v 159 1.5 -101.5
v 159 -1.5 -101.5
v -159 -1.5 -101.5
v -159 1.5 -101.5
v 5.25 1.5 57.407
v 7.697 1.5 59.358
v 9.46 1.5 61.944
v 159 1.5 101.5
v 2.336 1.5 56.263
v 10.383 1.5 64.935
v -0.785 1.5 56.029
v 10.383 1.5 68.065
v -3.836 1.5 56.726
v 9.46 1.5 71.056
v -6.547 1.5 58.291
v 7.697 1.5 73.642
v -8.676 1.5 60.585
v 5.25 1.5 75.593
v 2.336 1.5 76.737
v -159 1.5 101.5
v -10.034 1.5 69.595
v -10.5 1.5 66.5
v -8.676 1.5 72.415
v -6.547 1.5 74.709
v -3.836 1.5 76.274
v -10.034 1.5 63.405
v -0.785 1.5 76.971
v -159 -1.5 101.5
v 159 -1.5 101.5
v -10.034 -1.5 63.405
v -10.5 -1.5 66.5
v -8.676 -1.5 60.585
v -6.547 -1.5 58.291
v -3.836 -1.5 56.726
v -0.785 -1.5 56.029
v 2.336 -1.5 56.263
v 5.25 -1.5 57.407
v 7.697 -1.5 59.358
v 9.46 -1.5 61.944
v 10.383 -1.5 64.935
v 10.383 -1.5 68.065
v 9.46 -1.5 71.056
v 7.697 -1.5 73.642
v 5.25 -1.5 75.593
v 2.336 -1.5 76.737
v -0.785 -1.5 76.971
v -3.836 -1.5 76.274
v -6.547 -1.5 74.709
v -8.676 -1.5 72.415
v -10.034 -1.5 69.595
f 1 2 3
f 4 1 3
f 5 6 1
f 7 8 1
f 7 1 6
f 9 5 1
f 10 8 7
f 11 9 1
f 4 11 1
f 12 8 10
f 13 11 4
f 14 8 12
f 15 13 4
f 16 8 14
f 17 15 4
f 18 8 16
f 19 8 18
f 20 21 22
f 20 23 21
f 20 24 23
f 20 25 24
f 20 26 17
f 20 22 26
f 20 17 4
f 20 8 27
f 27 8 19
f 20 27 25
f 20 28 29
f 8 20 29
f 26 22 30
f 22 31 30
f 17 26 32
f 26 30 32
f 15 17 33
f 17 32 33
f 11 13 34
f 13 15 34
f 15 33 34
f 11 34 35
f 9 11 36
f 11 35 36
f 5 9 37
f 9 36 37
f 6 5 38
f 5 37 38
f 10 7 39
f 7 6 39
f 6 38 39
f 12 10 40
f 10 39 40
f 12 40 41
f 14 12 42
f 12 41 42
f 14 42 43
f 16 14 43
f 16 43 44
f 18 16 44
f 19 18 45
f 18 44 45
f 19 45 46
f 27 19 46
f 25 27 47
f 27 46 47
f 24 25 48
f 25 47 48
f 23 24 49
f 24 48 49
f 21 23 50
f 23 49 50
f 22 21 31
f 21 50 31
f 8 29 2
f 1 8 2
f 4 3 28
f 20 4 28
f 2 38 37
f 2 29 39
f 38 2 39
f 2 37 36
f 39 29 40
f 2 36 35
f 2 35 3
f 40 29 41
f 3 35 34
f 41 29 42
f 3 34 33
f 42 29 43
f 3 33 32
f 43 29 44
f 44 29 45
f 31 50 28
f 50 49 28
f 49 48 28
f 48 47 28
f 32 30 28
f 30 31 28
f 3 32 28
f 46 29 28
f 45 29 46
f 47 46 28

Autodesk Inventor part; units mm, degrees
ref_plane "YZ Plane" through (0, 0, 0) normal (1, 0, 0) x (0, 1, 0)
ref_plane "XZ Plane" through (0, 0, 0) normal (0, 1, 0) x (-1, 0, 0)
ref_plane "XY Plane" through (0, 0, 0) normal (0, 0, 1) x (1, 0, 0)
sketch "Szkic1" plane through (0, 0, 0) normal (0, 1, 0) x (-1, 0, 0)
  line L0 (-159, -101.5) -> (159, -101.5)
  line L1 (159, -101.5) -> (159, 101.5)
  line L2 (159, 101.5) -> (-159, 101.5)
  line L3 (-159, 101.5) -> (-159, -101.5)
  line L4 (-159, -101.5) -> (159, 101.5) construction
  line L5 (159, -101.5) -> (-159, 101.5) construction
  circle A0 centre (0, 66.5) radius 10.5
  point P0 (0, 0)
  dimension "d0" = 318
  dimension "d1" = 203
  dimension "d2" = 21
  dimension "d3" = 35
  dimension "d4" = 159
extrude "Wyciągnięcie proste1" add sketch "Szkic1" along normal mid plane 3
properties part number "scina_prawa"
